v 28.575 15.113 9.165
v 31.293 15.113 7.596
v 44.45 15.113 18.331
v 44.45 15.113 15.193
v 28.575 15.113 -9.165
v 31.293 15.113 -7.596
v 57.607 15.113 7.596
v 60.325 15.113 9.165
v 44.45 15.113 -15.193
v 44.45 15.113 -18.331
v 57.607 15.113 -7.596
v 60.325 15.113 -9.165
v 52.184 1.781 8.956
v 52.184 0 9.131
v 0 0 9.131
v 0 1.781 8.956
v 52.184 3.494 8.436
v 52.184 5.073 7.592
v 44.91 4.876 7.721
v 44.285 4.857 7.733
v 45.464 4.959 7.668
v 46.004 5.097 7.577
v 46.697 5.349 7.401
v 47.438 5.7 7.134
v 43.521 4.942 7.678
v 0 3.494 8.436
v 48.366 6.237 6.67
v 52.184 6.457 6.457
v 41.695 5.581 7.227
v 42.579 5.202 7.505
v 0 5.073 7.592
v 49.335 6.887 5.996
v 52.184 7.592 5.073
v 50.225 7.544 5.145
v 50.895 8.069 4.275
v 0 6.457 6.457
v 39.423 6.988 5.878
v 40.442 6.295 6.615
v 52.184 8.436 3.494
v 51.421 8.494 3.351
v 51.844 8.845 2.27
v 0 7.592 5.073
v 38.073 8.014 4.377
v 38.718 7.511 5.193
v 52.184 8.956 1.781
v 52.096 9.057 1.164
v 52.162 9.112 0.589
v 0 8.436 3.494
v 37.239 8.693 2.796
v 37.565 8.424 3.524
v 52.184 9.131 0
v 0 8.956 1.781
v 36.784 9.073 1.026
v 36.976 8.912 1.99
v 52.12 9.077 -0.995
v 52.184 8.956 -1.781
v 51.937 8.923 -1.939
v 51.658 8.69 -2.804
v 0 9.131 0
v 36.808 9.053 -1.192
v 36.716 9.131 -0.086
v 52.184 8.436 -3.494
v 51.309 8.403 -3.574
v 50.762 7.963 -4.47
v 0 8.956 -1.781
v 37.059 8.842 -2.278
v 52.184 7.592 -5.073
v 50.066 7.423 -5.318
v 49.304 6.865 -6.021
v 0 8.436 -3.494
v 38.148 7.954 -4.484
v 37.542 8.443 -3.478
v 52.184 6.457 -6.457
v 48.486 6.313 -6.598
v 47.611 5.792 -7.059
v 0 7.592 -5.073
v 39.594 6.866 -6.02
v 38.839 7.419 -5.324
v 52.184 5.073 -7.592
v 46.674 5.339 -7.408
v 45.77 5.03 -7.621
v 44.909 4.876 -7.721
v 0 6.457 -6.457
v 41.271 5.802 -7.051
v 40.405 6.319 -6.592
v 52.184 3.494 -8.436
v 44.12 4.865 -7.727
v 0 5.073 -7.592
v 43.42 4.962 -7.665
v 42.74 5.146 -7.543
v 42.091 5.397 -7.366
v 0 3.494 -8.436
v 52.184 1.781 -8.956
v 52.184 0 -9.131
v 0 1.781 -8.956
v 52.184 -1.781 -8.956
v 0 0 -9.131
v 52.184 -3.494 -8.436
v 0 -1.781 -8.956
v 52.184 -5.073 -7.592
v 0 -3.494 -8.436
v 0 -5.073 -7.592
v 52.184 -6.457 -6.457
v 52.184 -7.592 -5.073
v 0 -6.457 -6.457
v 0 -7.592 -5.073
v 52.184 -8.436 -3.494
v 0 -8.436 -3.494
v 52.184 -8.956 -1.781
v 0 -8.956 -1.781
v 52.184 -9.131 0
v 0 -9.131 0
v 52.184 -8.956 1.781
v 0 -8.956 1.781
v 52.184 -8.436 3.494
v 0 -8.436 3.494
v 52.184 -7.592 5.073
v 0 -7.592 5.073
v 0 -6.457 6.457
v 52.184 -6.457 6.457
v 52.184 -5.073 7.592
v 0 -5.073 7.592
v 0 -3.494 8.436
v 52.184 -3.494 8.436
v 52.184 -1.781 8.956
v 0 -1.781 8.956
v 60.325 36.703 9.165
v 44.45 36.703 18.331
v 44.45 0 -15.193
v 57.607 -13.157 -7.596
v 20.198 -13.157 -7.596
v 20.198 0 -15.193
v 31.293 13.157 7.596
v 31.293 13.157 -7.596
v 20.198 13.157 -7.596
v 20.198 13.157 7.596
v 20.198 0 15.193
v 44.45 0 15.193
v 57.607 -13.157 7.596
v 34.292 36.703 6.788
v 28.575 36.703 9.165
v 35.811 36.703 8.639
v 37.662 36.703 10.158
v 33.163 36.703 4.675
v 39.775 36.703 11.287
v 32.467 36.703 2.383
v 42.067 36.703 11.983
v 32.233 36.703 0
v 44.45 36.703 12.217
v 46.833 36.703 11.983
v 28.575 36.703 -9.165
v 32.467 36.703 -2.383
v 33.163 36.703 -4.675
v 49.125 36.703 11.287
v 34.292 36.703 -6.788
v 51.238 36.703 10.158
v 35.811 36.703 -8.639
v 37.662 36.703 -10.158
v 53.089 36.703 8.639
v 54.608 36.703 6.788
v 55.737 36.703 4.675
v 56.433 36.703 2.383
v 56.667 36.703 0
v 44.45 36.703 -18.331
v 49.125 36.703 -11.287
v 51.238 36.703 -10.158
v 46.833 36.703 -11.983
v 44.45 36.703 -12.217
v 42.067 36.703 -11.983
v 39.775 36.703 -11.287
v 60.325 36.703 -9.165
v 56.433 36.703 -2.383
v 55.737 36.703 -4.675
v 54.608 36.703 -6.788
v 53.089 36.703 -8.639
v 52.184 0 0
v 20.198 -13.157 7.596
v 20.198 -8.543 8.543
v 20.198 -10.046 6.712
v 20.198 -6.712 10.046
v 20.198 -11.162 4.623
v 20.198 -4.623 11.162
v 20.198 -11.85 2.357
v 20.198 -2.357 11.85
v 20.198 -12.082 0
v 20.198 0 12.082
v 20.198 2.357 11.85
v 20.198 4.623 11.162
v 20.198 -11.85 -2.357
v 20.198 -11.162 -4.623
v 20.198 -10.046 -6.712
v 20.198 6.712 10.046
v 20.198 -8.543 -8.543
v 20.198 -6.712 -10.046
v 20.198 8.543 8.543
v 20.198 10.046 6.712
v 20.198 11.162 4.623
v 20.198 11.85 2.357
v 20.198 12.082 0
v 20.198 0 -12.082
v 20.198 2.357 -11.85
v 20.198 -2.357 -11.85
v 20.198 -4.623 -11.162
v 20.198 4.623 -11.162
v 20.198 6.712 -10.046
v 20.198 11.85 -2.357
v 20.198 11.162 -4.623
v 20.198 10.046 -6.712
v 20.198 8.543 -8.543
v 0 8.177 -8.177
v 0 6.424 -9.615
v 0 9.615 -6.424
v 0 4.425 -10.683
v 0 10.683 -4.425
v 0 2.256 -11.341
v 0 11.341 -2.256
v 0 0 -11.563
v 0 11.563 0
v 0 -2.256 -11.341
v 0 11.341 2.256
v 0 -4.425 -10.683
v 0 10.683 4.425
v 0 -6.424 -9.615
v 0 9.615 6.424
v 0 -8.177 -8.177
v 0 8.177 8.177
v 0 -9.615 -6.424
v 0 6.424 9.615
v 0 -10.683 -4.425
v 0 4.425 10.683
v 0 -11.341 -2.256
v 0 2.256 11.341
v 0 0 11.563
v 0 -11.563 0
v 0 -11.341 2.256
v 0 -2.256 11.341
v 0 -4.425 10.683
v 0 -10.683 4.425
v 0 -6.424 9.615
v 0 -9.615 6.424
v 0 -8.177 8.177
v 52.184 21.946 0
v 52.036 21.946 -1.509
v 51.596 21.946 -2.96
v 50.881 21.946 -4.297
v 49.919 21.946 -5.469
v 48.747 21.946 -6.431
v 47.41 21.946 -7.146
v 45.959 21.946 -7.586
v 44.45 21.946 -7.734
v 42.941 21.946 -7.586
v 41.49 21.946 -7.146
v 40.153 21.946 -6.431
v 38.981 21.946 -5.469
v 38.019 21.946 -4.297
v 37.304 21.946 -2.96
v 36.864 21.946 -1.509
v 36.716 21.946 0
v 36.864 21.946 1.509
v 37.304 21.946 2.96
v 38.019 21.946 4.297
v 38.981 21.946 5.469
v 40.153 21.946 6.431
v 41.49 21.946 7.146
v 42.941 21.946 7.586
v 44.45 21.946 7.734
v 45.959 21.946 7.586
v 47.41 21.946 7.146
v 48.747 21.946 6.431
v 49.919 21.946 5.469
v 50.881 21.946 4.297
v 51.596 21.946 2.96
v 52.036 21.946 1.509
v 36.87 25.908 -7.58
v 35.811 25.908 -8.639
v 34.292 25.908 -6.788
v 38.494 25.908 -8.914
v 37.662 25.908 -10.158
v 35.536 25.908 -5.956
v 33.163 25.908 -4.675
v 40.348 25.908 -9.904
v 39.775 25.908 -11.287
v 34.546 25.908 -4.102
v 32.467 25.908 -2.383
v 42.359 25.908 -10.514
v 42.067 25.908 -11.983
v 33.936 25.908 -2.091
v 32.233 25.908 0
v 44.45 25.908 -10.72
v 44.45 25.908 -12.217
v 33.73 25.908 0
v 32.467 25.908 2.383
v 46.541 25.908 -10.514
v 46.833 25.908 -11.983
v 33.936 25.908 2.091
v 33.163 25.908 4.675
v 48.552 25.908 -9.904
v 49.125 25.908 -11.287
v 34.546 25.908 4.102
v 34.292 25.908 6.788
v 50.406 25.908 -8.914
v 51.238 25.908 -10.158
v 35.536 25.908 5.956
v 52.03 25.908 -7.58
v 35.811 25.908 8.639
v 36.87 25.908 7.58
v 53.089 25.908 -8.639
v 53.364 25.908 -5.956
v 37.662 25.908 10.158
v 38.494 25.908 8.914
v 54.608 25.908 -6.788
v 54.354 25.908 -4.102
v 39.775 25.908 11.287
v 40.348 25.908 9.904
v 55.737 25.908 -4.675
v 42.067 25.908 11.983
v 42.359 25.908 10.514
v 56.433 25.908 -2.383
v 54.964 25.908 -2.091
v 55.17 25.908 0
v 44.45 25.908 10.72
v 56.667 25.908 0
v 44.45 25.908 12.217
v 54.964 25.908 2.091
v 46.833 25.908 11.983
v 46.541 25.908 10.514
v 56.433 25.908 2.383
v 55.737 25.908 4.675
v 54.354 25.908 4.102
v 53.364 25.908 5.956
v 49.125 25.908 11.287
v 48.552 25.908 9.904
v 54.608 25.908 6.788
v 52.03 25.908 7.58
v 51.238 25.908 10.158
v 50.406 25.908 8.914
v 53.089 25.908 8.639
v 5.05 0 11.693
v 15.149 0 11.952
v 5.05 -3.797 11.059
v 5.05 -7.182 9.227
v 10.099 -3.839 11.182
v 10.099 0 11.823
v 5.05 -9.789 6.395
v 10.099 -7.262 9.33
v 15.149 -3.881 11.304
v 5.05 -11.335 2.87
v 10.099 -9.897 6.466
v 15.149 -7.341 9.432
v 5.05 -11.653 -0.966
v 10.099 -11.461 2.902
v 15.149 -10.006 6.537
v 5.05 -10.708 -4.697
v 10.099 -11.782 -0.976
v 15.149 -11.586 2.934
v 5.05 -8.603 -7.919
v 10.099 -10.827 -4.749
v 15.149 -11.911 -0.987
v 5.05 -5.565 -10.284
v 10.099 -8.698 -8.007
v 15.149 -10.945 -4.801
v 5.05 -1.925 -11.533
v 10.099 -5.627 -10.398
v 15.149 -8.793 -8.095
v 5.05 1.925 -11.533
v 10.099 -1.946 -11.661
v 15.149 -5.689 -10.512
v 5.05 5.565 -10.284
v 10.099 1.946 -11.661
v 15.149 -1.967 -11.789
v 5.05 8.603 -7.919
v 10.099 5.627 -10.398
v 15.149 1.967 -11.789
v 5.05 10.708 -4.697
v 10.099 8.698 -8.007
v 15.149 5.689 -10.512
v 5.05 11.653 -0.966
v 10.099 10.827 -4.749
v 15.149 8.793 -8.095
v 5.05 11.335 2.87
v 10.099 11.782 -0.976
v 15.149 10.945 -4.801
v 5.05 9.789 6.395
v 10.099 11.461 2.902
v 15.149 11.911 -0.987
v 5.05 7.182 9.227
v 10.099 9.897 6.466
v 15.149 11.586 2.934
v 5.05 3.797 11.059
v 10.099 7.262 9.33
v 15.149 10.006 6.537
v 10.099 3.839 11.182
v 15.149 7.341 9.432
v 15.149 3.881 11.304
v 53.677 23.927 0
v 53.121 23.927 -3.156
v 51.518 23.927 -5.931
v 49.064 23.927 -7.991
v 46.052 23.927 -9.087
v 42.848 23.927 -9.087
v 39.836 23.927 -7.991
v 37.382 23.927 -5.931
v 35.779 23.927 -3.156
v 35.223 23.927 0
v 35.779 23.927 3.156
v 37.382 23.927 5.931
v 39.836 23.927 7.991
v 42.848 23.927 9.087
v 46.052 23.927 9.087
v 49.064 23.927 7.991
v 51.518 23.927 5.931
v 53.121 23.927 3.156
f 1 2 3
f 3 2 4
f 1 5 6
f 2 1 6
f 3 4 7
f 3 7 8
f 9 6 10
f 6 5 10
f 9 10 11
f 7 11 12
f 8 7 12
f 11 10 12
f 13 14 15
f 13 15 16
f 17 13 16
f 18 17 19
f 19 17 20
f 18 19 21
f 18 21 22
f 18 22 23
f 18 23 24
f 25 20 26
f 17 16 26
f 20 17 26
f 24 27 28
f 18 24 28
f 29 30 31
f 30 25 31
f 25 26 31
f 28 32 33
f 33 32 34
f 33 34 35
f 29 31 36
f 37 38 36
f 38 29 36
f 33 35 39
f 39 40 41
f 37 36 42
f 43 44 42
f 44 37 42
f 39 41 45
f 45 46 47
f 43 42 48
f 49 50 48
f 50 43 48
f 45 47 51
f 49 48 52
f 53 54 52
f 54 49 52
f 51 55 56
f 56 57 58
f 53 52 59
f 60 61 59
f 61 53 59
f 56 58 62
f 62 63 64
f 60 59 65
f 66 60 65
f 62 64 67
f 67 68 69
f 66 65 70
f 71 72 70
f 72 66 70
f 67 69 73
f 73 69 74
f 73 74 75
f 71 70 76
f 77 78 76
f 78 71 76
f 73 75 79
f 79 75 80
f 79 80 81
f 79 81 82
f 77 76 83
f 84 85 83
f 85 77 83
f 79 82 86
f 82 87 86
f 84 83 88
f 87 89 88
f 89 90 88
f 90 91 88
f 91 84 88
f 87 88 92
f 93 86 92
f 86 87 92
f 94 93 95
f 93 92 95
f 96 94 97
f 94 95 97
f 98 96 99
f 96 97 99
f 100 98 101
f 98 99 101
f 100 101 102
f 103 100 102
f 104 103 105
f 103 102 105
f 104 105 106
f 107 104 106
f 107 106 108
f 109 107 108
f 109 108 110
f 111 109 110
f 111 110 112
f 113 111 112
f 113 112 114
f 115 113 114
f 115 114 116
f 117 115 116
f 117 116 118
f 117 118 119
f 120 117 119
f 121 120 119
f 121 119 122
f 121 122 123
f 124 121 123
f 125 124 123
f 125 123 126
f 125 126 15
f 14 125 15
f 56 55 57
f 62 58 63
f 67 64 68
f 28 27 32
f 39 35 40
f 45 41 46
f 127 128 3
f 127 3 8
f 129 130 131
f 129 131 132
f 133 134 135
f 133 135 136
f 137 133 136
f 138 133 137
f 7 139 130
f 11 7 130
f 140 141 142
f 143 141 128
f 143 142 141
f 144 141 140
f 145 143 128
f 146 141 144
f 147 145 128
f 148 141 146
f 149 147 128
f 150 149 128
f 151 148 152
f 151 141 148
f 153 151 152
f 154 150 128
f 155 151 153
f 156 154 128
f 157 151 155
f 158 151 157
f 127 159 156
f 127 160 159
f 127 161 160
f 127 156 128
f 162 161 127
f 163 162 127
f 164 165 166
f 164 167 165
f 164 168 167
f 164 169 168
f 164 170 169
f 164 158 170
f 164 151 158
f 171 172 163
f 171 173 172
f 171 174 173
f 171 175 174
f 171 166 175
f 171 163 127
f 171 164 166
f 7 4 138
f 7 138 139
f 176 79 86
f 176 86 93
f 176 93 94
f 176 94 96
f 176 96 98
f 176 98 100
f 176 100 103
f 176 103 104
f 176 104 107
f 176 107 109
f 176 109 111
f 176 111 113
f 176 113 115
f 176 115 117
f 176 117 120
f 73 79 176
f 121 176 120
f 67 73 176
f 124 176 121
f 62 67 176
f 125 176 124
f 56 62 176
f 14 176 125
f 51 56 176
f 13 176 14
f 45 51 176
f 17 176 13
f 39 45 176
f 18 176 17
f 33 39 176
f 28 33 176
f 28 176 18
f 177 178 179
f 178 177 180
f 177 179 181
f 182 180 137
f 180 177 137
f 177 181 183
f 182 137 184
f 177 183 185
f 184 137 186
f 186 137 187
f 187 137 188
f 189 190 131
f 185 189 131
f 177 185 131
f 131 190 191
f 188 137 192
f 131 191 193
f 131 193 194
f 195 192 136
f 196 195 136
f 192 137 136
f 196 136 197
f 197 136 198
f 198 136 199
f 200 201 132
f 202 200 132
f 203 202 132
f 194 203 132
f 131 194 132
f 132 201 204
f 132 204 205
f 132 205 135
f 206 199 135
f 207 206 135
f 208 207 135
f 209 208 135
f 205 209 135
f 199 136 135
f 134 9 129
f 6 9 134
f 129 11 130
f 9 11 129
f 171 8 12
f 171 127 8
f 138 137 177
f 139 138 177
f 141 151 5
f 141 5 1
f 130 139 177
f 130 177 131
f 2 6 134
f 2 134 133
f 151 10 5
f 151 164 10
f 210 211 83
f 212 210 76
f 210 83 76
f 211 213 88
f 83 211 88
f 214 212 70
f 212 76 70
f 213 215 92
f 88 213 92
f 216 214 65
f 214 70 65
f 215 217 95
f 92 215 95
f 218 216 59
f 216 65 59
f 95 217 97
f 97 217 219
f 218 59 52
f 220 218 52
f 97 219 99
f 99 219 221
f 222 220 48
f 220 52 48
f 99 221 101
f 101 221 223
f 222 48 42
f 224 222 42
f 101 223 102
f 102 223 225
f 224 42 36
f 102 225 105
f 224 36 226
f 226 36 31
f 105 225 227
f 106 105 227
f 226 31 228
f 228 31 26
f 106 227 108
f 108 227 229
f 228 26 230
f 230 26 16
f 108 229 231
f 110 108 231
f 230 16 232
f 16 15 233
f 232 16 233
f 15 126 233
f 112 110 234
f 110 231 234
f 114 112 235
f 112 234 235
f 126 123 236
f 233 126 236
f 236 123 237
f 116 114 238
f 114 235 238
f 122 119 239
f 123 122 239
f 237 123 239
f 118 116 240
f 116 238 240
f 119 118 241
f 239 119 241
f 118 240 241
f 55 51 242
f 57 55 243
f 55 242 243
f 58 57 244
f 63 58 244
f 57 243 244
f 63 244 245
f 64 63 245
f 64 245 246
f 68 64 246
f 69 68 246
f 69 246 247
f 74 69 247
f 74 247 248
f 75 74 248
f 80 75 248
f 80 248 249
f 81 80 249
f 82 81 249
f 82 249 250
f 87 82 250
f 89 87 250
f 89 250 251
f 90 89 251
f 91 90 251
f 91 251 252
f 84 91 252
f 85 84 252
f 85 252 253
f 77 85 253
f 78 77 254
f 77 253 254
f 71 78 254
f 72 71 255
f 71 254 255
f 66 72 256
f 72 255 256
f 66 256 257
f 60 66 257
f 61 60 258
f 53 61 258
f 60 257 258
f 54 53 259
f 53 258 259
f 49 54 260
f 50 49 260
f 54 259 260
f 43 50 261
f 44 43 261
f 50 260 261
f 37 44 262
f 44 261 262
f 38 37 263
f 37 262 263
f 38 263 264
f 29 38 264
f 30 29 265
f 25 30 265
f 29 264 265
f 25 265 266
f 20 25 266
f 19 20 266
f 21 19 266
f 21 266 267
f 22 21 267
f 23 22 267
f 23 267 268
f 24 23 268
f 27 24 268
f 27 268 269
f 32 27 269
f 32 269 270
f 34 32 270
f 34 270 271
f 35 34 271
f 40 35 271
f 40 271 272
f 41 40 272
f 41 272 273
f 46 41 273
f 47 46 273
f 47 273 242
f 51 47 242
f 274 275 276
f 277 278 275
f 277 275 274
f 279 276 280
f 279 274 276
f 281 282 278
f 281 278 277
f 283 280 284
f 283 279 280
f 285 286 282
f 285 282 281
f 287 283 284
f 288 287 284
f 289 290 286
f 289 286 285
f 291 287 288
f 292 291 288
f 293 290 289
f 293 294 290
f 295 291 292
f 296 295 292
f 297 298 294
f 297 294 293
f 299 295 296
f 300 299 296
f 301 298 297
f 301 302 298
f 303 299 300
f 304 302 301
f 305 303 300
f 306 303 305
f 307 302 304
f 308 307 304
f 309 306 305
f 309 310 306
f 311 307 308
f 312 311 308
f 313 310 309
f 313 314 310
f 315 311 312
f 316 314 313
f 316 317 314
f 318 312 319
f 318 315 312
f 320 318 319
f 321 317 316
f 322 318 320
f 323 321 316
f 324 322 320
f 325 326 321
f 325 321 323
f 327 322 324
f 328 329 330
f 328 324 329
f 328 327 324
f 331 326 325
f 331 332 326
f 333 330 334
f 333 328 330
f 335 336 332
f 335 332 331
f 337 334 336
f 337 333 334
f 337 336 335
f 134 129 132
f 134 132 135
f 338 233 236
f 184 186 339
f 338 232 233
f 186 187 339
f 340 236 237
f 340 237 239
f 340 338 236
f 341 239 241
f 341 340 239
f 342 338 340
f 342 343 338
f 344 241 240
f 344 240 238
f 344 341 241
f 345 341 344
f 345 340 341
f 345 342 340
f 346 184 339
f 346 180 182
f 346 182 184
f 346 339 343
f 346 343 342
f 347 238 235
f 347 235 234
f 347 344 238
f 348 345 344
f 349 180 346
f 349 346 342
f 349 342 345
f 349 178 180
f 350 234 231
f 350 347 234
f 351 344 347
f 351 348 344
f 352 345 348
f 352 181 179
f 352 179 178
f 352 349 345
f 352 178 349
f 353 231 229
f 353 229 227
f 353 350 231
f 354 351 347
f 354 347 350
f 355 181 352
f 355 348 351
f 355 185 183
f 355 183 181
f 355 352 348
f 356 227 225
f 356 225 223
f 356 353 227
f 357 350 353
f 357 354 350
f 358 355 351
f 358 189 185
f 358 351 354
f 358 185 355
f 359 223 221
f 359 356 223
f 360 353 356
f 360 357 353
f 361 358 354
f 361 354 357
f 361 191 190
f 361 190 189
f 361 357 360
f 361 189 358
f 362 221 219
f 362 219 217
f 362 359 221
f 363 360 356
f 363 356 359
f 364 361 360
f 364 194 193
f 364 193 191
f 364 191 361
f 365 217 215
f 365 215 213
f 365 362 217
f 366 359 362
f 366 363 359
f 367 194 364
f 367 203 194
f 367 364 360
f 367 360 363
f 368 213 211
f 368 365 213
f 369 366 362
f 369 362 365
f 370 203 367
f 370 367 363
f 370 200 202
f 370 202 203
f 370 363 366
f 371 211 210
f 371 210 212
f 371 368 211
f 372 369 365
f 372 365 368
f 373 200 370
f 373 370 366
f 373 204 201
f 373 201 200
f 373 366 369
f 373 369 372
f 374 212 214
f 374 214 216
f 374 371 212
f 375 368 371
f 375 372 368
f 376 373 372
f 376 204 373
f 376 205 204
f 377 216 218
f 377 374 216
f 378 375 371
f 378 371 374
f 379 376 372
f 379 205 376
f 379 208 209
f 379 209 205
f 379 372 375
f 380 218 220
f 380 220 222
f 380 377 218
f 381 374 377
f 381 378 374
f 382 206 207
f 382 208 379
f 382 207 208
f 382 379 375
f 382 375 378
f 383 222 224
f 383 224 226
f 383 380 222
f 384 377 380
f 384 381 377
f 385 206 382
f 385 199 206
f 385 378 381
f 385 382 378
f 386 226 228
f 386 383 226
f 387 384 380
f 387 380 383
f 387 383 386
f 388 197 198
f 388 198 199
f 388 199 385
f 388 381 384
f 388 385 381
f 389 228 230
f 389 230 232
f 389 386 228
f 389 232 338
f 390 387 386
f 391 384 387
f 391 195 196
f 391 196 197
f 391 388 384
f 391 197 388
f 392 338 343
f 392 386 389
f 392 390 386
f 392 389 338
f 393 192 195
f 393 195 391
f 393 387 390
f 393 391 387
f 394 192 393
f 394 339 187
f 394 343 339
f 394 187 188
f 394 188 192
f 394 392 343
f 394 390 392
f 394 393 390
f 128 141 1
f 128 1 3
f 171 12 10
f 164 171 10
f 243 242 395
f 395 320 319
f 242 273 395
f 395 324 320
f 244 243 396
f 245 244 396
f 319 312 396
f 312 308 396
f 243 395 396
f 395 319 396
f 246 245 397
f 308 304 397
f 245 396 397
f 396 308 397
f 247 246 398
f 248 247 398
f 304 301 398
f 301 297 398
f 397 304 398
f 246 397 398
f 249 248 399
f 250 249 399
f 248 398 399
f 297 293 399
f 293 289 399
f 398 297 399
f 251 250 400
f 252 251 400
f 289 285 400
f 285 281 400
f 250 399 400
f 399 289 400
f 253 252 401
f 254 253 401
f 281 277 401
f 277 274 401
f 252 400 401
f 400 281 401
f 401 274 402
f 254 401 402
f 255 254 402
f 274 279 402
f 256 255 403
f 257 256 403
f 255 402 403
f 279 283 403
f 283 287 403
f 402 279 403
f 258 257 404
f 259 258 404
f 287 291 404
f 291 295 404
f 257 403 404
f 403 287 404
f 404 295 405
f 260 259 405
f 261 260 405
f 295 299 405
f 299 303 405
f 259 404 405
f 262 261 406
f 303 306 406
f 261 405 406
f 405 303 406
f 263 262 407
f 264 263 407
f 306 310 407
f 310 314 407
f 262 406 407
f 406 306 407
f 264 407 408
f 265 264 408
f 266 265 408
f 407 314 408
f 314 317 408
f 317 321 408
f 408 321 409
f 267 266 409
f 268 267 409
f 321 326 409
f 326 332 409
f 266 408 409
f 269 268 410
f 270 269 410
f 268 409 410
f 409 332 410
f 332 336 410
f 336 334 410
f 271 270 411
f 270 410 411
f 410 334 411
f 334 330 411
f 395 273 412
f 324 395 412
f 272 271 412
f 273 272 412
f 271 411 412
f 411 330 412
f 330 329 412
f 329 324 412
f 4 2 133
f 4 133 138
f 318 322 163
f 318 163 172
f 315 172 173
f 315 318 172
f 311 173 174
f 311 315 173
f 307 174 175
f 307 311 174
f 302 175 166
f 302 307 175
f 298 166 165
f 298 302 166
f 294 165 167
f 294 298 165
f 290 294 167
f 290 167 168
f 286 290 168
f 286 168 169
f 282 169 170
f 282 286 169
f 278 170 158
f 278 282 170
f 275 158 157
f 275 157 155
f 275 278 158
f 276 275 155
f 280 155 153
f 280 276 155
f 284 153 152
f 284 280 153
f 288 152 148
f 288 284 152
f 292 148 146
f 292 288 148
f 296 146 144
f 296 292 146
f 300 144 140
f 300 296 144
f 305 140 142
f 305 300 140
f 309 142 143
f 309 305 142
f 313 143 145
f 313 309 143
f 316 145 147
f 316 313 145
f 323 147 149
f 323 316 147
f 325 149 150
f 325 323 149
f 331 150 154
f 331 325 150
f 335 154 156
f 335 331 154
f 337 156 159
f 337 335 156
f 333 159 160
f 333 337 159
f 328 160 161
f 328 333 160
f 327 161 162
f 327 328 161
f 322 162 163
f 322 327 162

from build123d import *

# Parameters (mm, degrees)
SKETCH3_R           = 9.1313
CUT_EXTRUDE1_DEPTH  = 52.1843
SKETCH4_R           = 7.7343
CUT_EXTRUDE2_DEPTH  = 25.908
CHAMFER1_SIZE       = 3.9624
CHAMFER1_SIZE2      = 2.985882568
SKETCH5_R           = 11.56335
CUT_EXTRUDE3_DEPTH  = 20.19808
CUT_EXTRUDE3_TAPER  = 1.47
SKETCH6_R           = 12.081672541
CUT_EXTRUDE4_DEPTH  = 20.19808
SKETCH7_R           = 12.2174
BOSS_EXTRUDE1_DEPTH = 10.795


with BuildPart() as part:
    # Sweep1: sweep along a path in Sketch1
    with BuildLine(Plane.XY) as sweep1_path:
        Line((0, 0), (44.45, 0))
        Line((44.45, 0), (44.45, 25.908))
    # Sketch2 → Sweep1 (sweep)
    with BuildSketch(Plane(origin=(0, 0, 0), x_dir=(0, 0, -1), z_dir=(1, 0, 0))):
        Polygon((7.596312962, 13.1572), (-7.596312962, 13.1572), (-15.192625924, 0), (-7.596312962, -13.1572), (7.596312962, -13.1572), (15.192625924, 0), align=None)
    sweep(path=sweep1_path.line, transition=Transition.RIGHT)

    # Sketch3 → Cut-Extrude1 (cut)
    with BuildSketch(Plane.ZY):
        Circle(SKETCH3_R)
    extrude(amount=-CUT_EXTRUDE1_DEPTH, mode=Mode.SUBTRACT)

    # Sketch4 → Cut-Extrude2 (cut)
    with BuildSketch(Plane(origin=(0, 25.908, 0), x_dir=(1, 0, 0), z_dir=(0, 1, 0))):
        with Locations((44.45, 0)):
            Circle(SKETCH4_R)
    extrude(amount=-CUT_EXTRUDE2_DEPTH, mode=Mode.SUBTRACT)

    # Chamfer1
    chamfer1_edges = [part.edges().sort_by_distance(p)[0] for p in [
        (36.7157, 25.908, 0),
    ]]
    chamfer1_side = [part.faces().sort_by_distance(p)[0] for p in [
        (36.7157, 15.380996251, 0),
    ]]
    chamfer(chamfer1_edges, length=CHAMFER1_SIZE, length2=CHAMFER1_SIZE2, reference=chamfer1_side[0])

    # Sketch5 → Cut-Extrude3 (cut)
    with BuildSketch(Plane.ZY):
        Polygon((-7.596312962, 13.1572), (-15.192625924, 0), (-7.596312962, -13.1572), (7.596312962, -13.1572), (15.192625924, 0), (7.596312962, 13.1572), align=None)
        Circle(SKETCH5_R, mode=Mode.SUBTRACT)
    extrude(amount=-CUT_EXTRUDE3_DEPTH, taper=CUT_EXTRUDE3_TAPER, mode=Mode.SUBTRACT)

    # Sketch6 → Cut-Extrude4 (cut)
    with BuildSketch(Plane.ZY):
        Polygon((-15.192625924, 0), (-7.596312962, 13.1572), (7.596312962, 13.1572), (15.192625924, 0), (7.596312962, -13.1572), (-7.596312962, -13.1572), align=None)
        Circle(SKETCH6_R, mode=Mode.SUBTRACT)
    extrude(amount=-CUT_EXTRUDE4_DEPTH, mode=Mode.SUBTRACT)

    # Sketch7 → Boss-Extrude1 (add, symmetric)
    with BuildSketch(Plane(origin=(0, 25.908, 0), x_dir=(1, 0, 0), z_dir=(0, 1, 0))):
        Polygon((44.45, 18.330871047), (28.575, 9.165435523), (28.575, -9.165435523), (44.45, -18.330871047), (60.325, -9.165435523), (60.325, 9.165435523), align=None)
        with Locations((44.45, 0)):
            Circle(SKETCH7_R, mode=Mode.SUBTRACT)
    extrude(amount=BOSS_EXTRUDE1_DEPTH, both=True)


solid = part.part
